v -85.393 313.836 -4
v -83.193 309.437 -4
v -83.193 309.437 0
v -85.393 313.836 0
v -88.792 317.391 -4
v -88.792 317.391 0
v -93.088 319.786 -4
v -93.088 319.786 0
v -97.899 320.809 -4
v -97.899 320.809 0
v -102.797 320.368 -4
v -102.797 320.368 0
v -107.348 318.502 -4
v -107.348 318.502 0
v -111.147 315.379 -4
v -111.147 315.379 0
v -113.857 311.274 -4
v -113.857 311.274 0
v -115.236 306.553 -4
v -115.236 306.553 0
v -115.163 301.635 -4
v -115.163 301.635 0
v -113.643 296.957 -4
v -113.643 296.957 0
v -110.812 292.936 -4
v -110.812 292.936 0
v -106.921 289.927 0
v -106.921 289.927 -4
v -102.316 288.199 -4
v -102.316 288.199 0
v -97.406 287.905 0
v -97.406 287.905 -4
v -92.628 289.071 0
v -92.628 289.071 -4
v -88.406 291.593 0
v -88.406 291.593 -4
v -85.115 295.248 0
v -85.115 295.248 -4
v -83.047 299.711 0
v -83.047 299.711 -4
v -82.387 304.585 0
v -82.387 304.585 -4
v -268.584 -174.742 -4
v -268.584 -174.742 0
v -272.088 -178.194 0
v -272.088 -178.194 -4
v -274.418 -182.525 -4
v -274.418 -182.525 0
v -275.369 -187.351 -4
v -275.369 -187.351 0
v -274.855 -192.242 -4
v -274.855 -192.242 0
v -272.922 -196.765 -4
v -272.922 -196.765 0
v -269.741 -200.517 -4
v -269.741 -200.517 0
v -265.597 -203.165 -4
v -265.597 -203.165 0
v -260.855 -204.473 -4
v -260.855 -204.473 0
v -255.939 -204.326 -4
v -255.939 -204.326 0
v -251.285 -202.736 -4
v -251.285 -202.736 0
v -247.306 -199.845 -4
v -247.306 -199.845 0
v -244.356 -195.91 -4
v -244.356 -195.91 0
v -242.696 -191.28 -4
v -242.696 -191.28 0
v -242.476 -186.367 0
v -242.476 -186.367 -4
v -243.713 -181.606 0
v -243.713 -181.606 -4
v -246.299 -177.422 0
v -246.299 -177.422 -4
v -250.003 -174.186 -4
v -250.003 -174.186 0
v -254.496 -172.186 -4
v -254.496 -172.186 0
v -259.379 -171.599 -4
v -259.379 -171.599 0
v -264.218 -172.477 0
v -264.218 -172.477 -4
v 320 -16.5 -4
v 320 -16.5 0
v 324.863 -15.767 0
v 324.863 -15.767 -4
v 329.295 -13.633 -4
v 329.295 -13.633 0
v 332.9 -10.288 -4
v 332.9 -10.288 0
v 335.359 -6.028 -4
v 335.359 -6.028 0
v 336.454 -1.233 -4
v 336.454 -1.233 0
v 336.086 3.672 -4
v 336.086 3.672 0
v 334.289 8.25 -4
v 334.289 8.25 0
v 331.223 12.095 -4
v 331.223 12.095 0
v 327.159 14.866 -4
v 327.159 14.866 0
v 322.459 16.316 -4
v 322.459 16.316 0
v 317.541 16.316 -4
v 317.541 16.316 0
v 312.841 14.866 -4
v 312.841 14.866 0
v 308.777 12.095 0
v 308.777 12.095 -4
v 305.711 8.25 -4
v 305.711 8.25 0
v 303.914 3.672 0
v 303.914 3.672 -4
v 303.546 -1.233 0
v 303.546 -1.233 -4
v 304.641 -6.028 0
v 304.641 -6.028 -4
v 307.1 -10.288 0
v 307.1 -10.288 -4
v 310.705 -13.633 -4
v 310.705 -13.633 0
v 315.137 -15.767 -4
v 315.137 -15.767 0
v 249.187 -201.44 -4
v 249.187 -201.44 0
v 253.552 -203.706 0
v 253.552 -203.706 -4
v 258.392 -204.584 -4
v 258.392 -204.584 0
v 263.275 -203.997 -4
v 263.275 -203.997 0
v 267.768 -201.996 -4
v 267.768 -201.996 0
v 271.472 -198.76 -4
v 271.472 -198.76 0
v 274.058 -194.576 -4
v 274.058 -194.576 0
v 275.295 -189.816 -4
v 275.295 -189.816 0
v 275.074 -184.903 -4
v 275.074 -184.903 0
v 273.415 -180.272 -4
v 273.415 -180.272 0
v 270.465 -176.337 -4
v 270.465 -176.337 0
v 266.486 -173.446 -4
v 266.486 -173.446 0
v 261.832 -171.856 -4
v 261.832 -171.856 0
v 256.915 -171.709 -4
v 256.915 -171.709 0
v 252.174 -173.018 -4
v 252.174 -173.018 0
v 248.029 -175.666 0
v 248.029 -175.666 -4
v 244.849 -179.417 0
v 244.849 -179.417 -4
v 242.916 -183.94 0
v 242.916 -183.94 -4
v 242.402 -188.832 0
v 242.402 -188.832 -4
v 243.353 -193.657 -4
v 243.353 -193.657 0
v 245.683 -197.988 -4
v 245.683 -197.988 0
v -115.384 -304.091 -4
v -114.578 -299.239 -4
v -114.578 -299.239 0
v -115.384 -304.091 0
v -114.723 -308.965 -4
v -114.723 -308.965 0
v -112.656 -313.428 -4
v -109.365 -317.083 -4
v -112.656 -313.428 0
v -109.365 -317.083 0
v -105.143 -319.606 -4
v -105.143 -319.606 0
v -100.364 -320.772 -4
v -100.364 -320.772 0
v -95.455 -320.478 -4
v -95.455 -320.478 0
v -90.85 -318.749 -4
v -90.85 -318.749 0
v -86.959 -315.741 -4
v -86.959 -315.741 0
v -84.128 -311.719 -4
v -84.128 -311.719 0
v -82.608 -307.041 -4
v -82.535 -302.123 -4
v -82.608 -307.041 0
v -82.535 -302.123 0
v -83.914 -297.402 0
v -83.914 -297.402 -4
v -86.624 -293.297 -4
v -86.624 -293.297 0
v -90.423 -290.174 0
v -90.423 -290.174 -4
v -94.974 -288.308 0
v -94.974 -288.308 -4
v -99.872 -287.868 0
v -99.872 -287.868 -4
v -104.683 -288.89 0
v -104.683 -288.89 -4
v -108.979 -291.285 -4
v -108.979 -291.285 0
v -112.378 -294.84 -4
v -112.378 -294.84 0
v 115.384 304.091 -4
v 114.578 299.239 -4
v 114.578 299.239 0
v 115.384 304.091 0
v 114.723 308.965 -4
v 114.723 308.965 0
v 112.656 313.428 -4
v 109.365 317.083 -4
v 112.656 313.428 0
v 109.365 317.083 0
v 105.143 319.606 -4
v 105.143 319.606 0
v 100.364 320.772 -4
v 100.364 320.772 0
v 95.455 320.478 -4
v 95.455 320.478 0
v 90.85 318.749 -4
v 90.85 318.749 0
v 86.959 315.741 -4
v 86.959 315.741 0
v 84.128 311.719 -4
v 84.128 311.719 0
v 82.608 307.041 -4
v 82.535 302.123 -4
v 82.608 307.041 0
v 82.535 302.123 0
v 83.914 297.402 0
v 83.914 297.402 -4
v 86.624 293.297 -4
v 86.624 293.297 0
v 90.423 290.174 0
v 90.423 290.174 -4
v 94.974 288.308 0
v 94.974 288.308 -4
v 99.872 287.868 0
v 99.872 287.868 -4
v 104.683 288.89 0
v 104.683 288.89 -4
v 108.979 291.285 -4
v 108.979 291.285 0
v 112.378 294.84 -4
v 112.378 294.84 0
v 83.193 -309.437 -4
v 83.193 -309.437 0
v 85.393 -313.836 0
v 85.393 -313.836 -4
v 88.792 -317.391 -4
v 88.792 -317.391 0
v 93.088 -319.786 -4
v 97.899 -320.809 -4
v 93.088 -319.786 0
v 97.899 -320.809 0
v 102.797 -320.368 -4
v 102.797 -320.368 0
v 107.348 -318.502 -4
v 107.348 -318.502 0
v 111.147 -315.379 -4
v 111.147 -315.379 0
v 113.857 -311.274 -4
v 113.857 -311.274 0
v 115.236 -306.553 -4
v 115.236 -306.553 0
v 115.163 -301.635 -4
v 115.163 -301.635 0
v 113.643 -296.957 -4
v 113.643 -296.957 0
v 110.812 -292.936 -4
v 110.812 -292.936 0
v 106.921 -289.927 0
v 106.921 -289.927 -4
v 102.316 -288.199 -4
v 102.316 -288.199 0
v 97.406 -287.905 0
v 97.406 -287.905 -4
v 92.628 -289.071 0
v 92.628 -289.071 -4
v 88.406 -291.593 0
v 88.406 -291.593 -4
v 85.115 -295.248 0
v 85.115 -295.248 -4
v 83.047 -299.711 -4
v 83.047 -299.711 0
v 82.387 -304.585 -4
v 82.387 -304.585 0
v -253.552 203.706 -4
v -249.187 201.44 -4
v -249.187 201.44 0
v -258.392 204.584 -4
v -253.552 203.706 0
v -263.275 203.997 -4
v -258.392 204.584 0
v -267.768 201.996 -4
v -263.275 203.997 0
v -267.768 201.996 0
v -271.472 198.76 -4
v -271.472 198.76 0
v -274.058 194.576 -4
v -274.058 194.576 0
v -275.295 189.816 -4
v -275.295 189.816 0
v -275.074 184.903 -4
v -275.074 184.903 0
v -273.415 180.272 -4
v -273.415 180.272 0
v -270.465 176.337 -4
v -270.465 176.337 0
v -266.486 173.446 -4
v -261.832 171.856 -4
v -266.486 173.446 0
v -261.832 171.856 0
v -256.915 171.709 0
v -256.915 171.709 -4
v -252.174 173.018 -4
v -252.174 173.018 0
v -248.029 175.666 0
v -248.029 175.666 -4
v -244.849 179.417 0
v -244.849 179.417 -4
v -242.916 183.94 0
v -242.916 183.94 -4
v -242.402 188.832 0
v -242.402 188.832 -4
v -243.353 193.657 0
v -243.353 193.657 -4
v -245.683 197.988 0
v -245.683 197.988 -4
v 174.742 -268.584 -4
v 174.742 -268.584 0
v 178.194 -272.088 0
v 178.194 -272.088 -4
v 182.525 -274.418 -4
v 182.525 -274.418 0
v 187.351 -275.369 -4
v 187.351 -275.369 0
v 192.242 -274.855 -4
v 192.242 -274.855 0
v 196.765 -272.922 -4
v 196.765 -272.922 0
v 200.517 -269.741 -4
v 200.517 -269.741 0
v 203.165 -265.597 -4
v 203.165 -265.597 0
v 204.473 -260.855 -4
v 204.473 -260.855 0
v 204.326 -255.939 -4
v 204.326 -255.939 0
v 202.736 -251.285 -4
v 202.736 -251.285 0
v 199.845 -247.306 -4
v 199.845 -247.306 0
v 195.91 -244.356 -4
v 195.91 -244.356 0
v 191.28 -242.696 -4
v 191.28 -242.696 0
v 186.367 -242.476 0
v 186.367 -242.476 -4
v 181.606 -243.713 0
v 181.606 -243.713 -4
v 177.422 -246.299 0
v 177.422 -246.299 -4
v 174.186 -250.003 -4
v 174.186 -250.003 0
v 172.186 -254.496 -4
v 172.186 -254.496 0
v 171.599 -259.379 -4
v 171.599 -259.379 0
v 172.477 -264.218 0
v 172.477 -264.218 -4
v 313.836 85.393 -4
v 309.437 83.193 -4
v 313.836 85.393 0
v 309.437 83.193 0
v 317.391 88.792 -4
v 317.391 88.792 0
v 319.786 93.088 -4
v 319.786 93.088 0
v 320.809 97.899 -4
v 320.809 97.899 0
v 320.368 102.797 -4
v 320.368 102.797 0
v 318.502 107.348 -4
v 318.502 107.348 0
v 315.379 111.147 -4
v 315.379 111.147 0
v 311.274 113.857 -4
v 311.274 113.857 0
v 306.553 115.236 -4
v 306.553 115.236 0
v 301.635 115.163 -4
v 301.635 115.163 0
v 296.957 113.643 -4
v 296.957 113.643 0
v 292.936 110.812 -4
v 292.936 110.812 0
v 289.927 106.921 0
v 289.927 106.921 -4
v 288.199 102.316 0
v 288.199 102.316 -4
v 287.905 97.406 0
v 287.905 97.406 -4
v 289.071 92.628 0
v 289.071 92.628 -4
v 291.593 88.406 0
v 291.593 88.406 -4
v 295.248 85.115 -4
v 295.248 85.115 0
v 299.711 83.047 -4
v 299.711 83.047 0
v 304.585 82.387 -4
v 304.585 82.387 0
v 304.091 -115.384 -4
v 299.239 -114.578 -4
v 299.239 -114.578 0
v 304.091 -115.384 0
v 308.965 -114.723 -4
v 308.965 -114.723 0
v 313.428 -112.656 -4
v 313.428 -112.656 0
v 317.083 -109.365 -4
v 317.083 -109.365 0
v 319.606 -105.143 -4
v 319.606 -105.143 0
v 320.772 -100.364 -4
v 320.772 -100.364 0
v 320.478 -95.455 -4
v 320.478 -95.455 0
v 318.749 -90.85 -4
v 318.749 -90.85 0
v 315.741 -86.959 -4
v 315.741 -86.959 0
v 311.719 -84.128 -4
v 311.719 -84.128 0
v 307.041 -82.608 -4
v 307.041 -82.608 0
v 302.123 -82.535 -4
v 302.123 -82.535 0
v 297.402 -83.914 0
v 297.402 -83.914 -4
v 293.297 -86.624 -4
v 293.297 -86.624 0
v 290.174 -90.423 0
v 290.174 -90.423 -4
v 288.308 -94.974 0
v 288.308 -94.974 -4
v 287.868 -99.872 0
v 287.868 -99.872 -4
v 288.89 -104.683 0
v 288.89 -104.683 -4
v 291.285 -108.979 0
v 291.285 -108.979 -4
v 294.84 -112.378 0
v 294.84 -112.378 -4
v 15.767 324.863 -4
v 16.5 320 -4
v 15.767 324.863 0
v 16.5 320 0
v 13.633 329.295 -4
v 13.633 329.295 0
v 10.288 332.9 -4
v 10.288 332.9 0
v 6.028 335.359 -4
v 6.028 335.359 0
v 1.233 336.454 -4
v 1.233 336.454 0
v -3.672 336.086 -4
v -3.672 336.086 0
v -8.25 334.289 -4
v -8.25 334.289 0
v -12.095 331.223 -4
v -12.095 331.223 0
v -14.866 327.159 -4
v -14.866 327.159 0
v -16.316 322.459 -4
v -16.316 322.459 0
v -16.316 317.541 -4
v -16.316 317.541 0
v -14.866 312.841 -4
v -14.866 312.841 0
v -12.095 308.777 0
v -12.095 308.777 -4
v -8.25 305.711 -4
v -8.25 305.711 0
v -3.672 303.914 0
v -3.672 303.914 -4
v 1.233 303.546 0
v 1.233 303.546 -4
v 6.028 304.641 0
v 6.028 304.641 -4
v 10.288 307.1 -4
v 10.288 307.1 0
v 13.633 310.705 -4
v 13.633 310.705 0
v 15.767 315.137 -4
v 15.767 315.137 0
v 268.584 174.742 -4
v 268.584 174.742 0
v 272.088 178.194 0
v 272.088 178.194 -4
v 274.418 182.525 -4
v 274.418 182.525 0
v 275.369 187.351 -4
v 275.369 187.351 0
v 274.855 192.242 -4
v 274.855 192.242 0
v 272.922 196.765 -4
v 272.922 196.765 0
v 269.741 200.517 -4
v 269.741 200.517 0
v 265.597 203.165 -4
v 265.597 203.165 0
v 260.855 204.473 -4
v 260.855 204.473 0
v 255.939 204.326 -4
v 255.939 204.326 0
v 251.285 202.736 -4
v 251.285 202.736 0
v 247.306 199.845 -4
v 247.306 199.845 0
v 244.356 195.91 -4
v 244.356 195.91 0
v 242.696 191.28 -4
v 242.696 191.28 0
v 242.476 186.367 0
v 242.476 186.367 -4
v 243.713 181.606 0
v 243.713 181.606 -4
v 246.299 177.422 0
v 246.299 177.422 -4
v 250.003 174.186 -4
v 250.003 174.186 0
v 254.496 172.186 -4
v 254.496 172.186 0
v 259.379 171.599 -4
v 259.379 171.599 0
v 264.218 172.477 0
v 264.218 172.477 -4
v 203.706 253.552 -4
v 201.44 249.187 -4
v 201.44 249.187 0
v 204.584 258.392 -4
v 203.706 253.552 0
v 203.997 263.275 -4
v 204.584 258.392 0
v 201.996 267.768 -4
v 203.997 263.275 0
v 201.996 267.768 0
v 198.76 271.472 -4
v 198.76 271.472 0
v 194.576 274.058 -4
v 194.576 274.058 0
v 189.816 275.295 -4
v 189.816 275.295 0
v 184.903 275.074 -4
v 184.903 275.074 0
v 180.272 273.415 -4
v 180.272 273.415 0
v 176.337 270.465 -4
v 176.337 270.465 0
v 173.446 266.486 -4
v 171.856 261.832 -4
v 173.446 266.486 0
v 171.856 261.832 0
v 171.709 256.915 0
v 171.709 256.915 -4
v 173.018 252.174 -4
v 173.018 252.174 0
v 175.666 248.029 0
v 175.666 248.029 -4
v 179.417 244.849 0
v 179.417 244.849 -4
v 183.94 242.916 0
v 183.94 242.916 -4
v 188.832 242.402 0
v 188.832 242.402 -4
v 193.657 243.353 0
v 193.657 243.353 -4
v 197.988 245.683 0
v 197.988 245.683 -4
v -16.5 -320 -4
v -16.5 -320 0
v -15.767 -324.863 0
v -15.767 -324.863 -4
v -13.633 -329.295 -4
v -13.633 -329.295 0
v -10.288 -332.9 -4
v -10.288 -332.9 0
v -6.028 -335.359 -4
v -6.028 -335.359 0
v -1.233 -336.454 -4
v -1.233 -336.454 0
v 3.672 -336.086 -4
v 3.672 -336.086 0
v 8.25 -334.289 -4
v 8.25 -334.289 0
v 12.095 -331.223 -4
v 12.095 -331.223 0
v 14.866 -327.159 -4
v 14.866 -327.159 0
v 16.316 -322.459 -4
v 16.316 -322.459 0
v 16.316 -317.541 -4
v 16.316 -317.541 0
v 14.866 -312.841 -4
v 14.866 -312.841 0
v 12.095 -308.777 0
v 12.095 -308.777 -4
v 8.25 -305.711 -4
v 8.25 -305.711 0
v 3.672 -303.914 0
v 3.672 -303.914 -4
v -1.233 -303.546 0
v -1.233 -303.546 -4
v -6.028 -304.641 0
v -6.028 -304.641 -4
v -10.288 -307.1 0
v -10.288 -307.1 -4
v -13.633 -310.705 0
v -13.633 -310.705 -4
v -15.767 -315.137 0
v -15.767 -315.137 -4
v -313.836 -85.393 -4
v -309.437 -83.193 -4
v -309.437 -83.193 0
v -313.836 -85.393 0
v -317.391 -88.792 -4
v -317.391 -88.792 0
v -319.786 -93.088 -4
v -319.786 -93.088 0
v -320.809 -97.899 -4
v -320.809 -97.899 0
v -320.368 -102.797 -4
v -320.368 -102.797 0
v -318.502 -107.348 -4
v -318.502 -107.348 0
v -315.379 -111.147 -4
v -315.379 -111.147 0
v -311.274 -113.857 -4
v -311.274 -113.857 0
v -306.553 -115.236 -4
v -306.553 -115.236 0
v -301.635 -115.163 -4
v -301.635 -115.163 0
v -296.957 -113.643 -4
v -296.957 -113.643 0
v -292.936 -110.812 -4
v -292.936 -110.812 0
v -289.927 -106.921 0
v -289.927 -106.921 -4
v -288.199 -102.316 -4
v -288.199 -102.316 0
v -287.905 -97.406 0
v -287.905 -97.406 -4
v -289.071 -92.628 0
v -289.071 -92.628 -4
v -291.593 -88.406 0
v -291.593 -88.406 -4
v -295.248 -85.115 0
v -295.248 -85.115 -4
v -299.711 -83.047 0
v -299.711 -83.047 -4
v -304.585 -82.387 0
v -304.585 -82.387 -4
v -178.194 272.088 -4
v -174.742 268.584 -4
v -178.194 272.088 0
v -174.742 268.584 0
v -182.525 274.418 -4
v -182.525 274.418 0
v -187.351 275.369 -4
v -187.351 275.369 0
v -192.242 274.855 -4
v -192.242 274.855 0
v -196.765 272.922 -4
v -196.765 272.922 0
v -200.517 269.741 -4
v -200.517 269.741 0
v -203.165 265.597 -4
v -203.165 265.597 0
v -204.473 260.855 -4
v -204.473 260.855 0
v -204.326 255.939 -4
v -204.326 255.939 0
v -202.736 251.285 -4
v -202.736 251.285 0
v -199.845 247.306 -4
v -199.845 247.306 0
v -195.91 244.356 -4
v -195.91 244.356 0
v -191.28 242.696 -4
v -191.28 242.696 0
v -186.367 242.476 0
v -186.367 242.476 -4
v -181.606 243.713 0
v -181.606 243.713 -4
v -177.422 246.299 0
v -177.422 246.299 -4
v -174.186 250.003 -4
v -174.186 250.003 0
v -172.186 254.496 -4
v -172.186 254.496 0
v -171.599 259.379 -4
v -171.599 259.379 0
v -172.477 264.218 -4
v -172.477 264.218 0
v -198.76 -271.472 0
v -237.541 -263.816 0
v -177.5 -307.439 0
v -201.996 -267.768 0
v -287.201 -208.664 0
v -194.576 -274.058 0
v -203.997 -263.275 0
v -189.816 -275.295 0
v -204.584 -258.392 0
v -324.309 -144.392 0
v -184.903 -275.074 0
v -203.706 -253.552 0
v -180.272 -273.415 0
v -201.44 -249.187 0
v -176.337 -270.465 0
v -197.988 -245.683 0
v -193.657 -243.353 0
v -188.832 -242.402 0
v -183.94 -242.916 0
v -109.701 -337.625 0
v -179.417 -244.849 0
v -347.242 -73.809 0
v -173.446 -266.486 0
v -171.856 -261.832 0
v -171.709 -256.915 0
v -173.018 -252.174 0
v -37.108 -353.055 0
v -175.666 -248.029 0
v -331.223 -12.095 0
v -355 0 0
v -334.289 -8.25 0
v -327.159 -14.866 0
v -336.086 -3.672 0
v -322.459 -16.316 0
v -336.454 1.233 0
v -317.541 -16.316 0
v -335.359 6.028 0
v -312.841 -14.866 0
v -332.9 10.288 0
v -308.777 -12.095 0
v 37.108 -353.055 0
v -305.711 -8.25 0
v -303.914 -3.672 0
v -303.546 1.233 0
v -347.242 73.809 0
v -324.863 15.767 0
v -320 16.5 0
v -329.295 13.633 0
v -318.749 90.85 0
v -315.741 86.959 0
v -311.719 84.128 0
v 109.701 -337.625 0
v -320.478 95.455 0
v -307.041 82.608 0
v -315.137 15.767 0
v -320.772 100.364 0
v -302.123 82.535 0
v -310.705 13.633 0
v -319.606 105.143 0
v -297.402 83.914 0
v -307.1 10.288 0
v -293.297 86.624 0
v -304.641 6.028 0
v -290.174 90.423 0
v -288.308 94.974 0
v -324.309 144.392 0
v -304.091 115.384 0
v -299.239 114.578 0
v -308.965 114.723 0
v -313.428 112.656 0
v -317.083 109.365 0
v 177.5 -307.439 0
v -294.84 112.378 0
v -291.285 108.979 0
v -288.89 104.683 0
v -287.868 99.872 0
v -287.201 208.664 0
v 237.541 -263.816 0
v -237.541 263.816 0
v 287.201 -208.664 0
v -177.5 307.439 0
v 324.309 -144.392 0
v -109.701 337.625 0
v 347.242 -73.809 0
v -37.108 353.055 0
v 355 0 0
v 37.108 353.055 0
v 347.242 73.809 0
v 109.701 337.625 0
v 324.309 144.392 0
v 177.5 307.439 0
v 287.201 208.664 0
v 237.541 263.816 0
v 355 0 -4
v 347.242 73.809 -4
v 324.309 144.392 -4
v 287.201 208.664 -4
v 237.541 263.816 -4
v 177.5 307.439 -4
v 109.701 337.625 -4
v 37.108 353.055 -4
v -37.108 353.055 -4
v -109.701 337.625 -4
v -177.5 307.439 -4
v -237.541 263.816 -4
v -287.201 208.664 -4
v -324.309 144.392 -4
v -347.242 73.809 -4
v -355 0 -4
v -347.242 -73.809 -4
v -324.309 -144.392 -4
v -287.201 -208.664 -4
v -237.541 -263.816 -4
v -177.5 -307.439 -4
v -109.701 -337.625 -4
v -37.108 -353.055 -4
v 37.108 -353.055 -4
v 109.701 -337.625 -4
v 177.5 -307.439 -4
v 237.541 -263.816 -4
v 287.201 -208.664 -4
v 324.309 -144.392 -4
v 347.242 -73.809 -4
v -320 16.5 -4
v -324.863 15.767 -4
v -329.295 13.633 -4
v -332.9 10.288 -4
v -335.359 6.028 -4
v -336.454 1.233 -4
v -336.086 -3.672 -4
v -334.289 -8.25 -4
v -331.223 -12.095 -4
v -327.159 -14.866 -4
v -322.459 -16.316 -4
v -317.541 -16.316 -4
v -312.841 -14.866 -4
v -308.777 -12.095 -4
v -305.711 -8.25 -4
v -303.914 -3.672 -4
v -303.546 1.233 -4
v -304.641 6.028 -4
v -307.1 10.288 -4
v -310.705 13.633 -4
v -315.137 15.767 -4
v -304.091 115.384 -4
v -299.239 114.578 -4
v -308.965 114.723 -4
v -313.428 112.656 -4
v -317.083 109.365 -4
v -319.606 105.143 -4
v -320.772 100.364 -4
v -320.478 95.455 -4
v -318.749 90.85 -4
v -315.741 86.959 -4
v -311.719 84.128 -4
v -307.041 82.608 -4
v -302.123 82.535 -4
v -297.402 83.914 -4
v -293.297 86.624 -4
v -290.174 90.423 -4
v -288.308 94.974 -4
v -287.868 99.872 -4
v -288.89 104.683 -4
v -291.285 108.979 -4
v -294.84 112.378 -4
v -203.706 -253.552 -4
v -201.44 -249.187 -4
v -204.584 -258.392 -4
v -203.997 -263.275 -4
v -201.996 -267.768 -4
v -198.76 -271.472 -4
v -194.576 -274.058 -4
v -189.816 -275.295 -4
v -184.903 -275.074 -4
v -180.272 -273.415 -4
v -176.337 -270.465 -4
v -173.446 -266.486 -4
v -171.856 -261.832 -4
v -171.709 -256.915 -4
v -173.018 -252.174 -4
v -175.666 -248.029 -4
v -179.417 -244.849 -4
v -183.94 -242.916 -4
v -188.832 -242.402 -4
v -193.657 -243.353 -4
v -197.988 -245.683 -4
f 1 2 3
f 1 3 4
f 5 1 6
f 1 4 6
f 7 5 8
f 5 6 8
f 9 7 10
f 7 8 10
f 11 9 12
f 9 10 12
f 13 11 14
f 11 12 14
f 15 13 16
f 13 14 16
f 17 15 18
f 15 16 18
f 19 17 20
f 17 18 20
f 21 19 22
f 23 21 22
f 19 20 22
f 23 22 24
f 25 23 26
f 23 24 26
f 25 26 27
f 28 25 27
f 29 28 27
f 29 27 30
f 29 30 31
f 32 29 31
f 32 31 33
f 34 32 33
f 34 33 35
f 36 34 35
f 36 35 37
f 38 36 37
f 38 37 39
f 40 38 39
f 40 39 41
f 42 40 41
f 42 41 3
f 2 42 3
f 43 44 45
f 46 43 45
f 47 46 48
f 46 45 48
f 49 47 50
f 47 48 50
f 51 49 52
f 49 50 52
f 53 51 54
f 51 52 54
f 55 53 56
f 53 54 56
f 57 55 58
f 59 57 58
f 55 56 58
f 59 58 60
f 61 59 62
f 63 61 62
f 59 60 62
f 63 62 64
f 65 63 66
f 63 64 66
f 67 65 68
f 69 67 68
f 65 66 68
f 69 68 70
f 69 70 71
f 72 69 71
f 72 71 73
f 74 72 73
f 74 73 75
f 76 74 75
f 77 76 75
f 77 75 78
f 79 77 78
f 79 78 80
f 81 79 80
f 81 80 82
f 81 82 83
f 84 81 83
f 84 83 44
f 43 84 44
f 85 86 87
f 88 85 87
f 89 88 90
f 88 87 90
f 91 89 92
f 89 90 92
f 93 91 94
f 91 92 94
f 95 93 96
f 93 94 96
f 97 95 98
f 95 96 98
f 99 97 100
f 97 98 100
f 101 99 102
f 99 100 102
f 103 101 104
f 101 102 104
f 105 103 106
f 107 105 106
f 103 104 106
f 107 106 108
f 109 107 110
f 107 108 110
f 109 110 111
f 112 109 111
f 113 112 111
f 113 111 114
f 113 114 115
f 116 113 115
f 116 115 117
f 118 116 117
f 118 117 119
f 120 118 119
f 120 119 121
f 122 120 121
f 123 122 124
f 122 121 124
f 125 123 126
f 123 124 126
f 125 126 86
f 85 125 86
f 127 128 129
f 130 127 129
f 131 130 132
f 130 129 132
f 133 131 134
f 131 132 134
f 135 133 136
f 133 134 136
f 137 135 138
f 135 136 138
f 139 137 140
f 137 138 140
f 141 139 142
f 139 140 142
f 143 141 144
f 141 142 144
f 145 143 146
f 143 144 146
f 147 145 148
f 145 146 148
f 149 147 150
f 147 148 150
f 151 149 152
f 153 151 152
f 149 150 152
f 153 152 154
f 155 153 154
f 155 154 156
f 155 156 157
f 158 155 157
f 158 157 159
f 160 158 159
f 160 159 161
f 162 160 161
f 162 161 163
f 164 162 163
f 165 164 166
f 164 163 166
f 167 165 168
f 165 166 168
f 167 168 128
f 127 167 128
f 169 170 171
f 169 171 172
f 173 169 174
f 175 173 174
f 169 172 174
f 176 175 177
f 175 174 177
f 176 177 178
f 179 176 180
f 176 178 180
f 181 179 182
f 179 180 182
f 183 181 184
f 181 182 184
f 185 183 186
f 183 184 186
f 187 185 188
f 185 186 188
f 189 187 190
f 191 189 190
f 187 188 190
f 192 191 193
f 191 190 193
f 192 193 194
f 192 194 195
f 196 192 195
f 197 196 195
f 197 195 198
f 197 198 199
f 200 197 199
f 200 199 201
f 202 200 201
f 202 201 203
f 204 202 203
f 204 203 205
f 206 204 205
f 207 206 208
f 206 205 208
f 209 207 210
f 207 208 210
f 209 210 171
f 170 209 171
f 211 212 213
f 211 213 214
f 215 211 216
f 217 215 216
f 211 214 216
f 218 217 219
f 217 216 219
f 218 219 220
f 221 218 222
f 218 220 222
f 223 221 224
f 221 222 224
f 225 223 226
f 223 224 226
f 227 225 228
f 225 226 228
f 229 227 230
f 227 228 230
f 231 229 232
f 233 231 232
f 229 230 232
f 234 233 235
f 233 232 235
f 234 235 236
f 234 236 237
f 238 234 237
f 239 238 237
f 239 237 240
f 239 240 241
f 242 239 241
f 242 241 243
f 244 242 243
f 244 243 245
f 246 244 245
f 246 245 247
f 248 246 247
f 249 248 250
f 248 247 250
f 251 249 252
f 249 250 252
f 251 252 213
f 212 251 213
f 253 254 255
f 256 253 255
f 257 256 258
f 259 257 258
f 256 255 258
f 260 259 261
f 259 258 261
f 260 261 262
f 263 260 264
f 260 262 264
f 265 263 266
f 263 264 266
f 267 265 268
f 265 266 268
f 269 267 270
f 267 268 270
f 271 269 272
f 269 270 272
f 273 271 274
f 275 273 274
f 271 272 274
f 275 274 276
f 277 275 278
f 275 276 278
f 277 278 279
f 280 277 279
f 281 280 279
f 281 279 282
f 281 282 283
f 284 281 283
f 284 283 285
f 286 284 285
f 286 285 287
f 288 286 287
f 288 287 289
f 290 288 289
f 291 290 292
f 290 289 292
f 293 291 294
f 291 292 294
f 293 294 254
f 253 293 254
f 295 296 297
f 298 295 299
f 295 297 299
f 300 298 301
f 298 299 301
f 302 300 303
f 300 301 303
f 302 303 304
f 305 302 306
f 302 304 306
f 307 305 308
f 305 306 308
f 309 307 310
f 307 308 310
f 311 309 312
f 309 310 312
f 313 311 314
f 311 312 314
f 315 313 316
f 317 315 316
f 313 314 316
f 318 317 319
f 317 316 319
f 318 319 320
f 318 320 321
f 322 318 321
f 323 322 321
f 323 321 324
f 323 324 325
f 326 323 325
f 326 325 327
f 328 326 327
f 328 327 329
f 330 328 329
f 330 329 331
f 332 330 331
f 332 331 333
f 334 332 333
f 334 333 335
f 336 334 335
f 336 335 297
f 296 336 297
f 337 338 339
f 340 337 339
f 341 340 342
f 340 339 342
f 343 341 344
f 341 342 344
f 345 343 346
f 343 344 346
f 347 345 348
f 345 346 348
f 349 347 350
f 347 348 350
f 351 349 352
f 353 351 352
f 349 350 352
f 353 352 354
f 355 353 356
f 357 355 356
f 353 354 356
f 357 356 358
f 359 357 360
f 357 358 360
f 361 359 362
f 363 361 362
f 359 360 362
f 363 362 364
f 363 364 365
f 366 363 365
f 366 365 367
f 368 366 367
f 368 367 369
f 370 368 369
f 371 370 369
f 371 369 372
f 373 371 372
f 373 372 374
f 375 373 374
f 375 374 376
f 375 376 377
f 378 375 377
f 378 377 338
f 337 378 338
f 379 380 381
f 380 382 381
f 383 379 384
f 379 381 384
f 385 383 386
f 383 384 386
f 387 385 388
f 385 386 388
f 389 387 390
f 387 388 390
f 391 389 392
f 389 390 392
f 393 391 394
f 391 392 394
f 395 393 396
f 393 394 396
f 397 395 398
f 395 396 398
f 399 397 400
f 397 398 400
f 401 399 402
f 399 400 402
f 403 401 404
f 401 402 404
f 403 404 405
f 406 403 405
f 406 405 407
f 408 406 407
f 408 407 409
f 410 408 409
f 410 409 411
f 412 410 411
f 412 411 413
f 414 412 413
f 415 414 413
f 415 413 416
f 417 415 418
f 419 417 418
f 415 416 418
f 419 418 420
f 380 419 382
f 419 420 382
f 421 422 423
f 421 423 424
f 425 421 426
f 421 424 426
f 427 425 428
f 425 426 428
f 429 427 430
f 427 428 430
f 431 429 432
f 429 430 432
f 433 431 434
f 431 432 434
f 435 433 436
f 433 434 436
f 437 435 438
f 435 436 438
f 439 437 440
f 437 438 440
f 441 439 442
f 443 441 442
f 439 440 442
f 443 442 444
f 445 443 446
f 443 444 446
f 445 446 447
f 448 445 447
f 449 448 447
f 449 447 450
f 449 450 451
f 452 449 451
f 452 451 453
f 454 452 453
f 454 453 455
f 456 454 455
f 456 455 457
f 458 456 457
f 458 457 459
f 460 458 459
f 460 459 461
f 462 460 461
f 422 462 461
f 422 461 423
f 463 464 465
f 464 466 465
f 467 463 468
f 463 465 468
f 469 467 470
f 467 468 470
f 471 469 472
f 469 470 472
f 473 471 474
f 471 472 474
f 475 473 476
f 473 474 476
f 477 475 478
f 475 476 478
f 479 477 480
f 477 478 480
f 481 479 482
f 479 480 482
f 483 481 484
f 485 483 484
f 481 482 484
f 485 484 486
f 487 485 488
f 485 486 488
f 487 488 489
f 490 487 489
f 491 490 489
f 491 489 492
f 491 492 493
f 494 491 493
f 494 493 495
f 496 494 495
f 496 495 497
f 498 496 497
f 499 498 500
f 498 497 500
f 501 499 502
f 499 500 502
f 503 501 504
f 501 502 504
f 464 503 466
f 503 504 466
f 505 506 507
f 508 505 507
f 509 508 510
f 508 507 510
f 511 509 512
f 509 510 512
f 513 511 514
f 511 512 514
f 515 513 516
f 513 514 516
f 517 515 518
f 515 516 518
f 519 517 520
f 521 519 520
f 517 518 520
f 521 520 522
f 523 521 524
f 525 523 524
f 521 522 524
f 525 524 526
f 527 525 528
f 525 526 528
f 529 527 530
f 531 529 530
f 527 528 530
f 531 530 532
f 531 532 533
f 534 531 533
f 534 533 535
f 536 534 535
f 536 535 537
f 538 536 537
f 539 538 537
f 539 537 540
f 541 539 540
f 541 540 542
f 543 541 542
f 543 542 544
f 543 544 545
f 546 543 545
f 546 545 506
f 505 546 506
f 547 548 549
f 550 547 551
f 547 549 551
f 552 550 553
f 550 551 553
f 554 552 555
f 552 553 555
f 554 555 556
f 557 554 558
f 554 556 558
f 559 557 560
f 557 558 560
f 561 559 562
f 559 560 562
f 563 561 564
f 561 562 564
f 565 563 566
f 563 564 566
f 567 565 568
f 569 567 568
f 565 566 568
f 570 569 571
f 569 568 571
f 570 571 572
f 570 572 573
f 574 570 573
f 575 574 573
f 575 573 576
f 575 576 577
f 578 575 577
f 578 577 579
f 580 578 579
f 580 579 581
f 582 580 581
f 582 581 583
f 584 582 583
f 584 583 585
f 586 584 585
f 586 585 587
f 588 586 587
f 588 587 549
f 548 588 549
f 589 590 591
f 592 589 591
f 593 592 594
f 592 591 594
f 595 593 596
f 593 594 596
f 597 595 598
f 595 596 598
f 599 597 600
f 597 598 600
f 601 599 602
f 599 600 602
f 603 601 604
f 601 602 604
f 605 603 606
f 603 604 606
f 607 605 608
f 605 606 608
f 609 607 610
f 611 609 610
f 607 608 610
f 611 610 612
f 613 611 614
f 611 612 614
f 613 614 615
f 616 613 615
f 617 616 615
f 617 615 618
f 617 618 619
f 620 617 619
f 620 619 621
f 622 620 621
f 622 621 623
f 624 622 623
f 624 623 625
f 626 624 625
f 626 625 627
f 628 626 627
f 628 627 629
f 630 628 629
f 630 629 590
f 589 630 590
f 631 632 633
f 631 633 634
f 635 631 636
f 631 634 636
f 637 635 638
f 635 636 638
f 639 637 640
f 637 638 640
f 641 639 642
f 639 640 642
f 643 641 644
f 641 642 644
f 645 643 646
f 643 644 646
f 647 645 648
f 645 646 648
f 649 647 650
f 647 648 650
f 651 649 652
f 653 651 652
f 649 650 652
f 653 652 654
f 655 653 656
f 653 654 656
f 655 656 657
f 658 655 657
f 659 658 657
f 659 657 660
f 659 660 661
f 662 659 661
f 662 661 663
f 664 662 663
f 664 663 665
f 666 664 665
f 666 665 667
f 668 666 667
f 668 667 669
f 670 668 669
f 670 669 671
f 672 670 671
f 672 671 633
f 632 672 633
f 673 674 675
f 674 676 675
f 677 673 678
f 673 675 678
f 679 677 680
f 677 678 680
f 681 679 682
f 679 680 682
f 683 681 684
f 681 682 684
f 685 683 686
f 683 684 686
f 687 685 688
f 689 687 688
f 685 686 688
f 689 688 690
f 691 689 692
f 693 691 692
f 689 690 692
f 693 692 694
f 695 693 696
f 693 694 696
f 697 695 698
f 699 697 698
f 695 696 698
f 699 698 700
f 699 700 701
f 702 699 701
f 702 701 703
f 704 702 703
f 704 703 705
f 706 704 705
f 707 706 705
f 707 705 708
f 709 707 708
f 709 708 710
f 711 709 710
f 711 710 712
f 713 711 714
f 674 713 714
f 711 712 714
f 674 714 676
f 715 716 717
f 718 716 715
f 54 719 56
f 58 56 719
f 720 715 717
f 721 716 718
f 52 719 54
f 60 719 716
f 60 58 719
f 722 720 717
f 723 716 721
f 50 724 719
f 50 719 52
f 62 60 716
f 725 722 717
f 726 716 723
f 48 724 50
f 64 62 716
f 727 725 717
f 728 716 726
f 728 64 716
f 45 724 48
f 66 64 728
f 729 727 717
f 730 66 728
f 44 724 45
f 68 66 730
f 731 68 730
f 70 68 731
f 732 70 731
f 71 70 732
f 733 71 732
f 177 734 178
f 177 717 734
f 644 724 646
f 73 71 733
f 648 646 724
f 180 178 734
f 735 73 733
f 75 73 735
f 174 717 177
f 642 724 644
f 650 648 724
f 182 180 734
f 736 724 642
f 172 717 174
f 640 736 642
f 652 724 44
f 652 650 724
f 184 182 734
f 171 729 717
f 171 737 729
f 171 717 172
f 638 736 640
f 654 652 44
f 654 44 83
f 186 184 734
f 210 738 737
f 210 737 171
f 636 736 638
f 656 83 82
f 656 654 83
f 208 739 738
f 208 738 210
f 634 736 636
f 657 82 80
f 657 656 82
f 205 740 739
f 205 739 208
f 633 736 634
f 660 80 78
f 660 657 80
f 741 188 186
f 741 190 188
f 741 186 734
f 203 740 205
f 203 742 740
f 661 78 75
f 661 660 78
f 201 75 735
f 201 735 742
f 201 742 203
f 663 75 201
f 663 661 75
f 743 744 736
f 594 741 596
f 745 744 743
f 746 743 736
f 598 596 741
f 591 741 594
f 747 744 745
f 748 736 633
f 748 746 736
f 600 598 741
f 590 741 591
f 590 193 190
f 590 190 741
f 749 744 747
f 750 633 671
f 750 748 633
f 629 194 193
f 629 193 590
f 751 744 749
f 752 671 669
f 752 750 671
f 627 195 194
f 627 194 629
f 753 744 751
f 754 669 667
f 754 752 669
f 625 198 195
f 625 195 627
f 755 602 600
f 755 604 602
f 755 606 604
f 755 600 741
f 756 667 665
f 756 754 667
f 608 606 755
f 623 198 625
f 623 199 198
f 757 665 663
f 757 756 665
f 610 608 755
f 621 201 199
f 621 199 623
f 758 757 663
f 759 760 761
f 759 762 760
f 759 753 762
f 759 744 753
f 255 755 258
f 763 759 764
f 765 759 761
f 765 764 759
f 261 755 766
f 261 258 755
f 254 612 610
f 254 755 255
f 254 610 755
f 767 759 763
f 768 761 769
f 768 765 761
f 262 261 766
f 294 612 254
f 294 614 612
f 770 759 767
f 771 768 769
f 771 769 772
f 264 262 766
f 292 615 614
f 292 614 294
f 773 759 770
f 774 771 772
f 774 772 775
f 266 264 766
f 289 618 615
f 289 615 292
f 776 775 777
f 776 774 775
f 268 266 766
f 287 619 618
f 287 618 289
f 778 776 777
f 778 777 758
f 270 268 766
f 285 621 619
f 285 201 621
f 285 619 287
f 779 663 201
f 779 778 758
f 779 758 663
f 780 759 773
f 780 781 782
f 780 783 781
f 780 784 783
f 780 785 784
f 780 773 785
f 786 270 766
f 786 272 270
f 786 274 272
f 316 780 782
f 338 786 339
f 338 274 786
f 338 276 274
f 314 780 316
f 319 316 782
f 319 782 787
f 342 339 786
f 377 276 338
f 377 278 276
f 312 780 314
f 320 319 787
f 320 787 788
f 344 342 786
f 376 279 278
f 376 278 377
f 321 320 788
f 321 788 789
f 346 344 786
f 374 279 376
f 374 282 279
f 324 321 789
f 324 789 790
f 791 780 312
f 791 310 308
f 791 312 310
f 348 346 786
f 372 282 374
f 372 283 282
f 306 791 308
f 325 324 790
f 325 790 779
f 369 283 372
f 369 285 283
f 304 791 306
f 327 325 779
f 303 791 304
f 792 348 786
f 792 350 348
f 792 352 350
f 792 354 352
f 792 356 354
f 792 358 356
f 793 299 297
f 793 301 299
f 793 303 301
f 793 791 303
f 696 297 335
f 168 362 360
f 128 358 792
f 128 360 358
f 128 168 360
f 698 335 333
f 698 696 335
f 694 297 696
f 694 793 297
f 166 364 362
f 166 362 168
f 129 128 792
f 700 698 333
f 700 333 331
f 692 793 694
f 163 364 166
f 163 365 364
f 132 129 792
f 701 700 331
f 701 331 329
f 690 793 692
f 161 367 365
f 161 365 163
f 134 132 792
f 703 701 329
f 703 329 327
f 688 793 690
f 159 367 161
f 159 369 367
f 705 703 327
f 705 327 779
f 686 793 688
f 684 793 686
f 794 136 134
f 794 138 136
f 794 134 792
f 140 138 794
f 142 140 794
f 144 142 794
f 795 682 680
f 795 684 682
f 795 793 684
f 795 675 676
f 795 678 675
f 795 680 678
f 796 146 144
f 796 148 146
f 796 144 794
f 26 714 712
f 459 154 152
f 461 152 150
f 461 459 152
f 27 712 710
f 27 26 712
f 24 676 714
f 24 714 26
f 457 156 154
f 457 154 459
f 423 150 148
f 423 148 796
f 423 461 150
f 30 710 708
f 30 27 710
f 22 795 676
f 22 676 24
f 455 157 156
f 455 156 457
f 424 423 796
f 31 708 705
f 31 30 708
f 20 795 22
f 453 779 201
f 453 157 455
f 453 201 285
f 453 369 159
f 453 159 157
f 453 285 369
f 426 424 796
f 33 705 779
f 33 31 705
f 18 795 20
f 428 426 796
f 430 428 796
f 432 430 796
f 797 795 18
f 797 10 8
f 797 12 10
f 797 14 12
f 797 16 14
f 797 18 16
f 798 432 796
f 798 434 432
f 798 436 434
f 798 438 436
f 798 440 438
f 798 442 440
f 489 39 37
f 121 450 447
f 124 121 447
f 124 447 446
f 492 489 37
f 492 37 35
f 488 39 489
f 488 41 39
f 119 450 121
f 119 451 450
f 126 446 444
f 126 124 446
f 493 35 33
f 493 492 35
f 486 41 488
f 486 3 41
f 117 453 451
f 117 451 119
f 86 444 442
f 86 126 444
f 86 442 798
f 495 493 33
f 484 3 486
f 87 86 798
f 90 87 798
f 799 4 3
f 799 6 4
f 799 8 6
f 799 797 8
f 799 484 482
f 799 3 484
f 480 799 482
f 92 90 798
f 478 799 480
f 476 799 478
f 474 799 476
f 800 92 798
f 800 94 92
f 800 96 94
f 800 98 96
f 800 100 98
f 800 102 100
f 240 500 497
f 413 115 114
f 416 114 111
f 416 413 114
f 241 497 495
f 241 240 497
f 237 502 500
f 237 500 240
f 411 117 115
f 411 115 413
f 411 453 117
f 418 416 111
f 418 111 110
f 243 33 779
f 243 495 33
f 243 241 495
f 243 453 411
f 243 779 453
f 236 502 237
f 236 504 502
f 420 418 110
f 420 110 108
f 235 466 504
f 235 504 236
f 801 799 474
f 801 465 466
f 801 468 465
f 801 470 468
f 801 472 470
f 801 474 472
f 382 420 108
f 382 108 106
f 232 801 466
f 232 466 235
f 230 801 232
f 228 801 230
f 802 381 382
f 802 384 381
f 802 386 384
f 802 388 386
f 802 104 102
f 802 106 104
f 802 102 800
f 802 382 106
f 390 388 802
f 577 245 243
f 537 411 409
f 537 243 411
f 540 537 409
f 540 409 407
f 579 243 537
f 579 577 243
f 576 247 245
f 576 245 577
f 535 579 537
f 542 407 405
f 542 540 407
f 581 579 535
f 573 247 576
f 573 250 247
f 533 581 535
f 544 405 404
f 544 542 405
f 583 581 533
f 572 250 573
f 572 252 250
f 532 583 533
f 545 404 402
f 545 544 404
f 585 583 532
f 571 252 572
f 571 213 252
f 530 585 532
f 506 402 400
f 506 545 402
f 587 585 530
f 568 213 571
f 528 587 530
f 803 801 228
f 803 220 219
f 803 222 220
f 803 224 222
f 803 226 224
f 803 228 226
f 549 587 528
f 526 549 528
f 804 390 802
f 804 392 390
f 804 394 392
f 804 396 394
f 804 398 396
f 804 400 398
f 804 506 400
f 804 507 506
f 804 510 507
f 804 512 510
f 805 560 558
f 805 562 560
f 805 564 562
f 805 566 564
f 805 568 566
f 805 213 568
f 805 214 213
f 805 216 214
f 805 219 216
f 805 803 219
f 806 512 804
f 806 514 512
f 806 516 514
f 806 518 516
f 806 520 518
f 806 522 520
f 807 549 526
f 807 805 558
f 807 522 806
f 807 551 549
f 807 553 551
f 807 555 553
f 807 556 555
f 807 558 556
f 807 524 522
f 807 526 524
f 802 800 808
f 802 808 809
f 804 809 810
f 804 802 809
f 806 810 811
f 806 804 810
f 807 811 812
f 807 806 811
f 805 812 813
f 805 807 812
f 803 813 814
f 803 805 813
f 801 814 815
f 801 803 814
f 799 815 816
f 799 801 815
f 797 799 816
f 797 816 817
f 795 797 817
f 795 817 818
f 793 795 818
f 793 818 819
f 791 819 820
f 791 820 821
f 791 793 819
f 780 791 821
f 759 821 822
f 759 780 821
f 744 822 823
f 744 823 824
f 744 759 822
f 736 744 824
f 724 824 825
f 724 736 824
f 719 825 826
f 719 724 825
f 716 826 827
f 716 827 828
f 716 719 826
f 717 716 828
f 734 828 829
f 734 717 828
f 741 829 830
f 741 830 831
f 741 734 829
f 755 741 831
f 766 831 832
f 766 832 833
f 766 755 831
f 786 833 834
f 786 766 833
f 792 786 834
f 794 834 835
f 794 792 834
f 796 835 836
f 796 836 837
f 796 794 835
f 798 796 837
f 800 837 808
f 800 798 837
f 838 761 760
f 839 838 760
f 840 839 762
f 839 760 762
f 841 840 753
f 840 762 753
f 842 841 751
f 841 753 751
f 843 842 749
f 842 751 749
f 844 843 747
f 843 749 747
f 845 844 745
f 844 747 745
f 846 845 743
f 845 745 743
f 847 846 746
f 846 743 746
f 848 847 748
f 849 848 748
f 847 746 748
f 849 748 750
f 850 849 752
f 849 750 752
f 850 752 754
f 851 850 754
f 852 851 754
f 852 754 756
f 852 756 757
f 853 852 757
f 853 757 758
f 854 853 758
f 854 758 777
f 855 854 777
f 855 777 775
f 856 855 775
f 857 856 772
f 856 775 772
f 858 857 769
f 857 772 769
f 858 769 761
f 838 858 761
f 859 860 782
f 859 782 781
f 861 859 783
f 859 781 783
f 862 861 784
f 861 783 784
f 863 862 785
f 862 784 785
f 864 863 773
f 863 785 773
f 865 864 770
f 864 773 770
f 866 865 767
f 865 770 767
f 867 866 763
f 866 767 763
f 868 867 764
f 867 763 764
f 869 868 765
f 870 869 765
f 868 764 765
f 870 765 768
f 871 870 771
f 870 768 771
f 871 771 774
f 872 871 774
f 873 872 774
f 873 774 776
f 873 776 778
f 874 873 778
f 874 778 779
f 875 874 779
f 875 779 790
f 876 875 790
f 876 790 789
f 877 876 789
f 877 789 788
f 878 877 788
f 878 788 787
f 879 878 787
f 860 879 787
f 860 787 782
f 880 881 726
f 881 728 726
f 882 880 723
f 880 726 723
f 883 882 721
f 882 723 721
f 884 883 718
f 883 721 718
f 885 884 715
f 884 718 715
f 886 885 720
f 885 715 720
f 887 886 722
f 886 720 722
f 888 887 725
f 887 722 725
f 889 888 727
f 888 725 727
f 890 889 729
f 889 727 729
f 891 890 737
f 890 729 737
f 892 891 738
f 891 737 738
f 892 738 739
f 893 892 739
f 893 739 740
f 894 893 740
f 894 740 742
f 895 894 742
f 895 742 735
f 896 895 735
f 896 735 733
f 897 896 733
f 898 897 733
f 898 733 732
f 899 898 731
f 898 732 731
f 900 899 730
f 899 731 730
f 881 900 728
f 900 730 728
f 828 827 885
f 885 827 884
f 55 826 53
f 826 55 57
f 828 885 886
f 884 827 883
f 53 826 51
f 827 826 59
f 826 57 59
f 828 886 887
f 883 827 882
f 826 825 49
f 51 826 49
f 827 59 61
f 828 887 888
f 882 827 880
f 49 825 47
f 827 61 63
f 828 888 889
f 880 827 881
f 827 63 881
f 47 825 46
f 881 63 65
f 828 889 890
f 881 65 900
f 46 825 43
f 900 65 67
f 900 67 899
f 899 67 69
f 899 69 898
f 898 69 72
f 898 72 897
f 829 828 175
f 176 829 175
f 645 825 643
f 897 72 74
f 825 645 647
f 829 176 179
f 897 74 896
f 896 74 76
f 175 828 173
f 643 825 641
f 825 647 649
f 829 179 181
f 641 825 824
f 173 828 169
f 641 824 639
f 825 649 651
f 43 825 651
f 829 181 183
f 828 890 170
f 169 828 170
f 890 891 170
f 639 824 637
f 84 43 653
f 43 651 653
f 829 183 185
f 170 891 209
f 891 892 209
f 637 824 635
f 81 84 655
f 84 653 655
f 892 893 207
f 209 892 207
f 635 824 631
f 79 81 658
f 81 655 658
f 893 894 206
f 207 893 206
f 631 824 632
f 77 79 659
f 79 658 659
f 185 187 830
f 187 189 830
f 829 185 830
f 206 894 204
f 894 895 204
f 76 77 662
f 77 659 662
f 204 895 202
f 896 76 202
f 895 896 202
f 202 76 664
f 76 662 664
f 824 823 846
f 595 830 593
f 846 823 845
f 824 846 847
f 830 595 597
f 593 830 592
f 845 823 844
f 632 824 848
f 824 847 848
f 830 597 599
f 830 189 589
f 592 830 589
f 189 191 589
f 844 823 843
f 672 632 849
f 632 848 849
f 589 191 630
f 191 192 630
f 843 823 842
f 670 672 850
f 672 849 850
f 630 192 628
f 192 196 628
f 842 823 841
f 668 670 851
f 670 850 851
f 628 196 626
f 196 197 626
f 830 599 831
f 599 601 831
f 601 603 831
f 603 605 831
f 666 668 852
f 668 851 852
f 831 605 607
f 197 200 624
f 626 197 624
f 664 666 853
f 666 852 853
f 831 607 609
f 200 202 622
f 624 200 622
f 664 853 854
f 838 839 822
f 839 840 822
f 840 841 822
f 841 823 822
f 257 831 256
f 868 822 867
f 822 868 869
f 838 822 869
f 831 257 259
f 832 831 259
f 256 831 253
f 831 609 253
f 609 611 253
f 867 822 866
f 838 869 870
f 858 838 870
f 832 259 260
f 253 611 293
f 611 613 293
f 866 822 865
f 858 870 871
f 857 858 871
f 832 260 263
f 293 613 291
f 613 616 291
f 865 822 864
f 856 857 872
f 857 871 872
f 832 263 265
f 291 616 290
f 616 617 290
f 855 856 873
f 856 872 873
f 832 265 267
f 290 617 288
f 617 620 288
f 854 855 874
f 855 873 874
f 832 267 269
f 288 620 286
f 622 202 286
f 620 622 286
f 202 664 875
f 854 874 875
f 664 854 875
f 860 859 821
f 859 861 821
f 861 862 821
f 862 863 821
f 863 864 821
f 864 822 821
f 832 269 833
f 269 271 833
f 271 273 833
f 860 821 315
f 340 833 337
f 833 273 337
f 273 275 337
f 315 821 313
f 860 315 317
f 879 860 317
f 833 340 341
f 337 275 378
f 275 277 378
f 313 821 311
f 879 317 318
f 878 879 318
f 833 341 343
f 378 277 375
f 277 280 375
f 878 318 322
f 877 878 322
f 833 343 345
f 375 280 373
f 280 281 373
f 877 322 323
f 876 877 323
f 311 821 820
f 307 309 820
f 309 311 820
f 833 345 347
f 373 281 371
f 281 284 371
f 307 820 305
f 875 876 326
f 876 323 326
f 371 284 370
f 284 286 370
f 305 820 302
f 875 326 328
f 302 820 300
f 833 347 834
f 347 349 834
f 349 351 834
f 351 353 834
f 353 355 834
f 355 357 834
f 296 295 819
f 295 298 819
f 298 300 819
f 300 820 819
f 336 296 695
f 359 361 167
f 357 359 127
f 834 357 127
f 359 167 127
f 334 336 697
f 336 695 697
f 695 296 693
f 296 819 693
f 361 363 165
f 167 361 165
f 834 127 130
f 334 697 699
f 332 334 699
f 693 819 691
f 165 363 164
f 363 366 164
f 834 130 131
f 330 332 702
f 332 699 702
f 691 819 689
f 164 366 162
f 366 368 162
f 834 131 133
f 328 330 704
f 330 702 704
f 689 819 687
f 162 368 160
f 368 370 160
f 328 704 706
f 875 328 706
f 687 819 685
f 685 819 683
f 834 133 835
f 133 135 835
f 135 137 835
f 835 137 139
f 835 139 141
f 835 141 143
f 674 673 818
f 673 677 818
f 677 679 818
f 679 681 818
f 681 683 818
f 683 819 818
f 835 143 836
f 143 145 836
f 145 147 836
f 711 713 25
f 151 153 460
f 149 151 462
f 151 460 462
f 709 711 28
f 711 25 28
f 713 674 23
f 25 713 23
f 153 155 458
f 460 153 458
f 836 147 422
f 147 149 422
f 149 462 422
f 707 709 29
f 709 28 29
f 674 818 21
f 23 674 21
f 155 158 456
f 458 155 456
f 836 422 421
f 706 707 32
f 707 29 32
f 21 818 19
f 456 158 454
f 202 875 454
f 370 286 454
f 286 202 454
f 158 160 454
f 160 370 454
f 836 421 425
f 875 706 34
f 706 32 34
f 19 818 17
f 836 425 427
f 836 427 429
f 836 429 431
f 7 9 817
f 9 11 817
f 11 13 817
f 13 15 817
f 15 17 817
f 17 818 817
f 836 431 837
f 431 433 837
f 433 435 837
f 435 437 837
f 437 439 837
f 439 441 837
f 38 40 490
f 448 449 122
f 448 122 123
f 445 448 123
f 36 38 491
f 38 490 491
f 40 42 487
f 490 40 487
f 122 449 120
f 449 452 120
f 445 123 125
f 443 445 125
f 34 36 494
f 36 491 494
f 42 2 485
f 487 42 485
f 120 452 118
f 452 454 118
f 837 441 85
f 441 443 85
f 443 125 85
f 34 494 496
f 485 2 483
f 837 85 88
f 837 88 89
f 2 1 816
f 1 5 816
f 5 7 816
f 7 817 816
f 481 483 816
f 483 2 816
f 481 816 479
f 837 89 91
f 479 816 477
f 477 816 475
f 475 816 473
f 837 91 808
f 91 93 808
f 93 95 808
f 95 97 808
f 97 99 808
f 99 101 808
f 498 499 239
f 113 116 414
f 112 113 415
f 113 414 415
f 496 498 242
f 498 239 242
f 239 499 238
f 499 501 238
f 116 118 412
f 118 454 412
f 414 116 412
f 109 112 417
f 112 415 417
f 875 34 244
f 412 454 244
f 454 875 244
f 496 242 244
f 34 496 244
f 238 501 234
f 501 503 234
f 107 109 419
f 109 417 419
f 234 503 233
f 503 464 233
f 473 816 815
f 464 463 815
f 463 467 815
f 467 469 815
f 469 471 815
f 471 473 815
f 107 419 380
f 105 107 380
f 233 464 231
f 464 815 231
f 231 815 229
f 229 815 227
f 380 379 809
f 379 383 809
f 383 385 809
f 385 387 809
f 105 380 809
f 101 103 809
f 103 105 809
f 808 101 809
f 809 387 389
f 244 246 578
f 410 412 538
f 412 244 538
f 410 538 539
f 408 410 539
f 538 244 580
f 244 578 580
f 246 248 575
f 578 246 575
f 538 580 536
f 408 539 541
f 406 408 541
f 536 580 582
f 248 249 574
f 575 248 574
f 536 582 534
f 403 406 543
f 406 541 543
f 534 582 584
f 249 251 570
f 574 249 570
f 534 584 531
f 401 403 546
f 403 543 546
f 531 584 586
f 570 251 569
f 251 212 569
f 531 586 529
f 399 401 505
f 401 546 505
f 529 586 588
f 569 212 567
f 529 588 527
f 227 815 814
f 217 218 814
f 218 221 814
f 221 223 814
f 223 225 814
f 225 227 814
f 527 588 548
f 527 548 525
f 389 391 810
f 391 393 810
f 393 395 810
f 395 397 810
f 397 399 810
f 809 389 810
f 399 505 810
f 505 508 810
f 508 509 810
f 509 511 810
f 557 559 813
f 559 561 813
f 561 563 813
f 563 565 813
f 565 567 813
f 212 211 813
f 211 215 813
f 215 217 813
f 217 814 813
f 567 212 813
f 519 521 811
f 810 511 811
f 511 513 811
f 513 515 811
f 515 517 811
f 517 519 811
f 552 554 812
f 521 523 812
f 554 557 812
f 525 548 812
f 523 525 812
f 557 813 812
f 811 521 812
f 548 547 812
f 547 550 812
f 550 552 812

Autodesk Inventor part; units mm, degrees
ref_plane "YZ Plane" through (0, 0, 0) normal (1, 0, 0) x (0, 1, 0)
ref_plane "XZ Plane" through (0, 0, 0) normal (0, 1, 0) x (-1, 0, 0)
ref_plane "XY Plane" through (0, 0, 0) normal (0, 0, 1) x (1, 0, 0)
sketch "Sketch1" plane through (0, 0, 0) normal (0, 0, 1) x (1, 0, 0)
  circle A0 centre (0, 0) radius 355
  dimension "d0" = 710
extrude "Plate1" add sketch "Sketch1" against normal blind 4
sketch "Sketch2" plane through (0, 0, 0) normal (0, 0, 1) x (1, 0, 0)
  circle A0 centre (0, 0) radius 320 construction
  circle A1 centre (0, 320) radius 16.5
  dimension "d2" = 640
  dimension "d3" = 33
extrude "Extrusion1" cut sketch "Sketch2" against normal through all
pattern_circular "Circular Pattern1" count 20 over 360 about axis through (0, 0, -10) along (0, 0, 1) of "Extrusion1"
equation "\"d1\" = Thickness"
equation "\"BendReliefWidth\" = Thickness"
equation "\"BendReliefDepth\" = 0.5 * Thickness"
equation "\"CornerReliefSize\" = 4 * Thickness"
equation "\"MinimumRemnant\" = 2 * Thickness"
equation "\"TransitionRadius\" = BendRadius"
equation "\"JacobiRadiusSize\" = BendRadius"
equation "\"GapSize\" = Thickness"
equation "\"Thickness\" = 4"
equation "\"BendRadius\" = 6"
properties part number "MSC 037 flange cover 500" material "Stainless Steel"
